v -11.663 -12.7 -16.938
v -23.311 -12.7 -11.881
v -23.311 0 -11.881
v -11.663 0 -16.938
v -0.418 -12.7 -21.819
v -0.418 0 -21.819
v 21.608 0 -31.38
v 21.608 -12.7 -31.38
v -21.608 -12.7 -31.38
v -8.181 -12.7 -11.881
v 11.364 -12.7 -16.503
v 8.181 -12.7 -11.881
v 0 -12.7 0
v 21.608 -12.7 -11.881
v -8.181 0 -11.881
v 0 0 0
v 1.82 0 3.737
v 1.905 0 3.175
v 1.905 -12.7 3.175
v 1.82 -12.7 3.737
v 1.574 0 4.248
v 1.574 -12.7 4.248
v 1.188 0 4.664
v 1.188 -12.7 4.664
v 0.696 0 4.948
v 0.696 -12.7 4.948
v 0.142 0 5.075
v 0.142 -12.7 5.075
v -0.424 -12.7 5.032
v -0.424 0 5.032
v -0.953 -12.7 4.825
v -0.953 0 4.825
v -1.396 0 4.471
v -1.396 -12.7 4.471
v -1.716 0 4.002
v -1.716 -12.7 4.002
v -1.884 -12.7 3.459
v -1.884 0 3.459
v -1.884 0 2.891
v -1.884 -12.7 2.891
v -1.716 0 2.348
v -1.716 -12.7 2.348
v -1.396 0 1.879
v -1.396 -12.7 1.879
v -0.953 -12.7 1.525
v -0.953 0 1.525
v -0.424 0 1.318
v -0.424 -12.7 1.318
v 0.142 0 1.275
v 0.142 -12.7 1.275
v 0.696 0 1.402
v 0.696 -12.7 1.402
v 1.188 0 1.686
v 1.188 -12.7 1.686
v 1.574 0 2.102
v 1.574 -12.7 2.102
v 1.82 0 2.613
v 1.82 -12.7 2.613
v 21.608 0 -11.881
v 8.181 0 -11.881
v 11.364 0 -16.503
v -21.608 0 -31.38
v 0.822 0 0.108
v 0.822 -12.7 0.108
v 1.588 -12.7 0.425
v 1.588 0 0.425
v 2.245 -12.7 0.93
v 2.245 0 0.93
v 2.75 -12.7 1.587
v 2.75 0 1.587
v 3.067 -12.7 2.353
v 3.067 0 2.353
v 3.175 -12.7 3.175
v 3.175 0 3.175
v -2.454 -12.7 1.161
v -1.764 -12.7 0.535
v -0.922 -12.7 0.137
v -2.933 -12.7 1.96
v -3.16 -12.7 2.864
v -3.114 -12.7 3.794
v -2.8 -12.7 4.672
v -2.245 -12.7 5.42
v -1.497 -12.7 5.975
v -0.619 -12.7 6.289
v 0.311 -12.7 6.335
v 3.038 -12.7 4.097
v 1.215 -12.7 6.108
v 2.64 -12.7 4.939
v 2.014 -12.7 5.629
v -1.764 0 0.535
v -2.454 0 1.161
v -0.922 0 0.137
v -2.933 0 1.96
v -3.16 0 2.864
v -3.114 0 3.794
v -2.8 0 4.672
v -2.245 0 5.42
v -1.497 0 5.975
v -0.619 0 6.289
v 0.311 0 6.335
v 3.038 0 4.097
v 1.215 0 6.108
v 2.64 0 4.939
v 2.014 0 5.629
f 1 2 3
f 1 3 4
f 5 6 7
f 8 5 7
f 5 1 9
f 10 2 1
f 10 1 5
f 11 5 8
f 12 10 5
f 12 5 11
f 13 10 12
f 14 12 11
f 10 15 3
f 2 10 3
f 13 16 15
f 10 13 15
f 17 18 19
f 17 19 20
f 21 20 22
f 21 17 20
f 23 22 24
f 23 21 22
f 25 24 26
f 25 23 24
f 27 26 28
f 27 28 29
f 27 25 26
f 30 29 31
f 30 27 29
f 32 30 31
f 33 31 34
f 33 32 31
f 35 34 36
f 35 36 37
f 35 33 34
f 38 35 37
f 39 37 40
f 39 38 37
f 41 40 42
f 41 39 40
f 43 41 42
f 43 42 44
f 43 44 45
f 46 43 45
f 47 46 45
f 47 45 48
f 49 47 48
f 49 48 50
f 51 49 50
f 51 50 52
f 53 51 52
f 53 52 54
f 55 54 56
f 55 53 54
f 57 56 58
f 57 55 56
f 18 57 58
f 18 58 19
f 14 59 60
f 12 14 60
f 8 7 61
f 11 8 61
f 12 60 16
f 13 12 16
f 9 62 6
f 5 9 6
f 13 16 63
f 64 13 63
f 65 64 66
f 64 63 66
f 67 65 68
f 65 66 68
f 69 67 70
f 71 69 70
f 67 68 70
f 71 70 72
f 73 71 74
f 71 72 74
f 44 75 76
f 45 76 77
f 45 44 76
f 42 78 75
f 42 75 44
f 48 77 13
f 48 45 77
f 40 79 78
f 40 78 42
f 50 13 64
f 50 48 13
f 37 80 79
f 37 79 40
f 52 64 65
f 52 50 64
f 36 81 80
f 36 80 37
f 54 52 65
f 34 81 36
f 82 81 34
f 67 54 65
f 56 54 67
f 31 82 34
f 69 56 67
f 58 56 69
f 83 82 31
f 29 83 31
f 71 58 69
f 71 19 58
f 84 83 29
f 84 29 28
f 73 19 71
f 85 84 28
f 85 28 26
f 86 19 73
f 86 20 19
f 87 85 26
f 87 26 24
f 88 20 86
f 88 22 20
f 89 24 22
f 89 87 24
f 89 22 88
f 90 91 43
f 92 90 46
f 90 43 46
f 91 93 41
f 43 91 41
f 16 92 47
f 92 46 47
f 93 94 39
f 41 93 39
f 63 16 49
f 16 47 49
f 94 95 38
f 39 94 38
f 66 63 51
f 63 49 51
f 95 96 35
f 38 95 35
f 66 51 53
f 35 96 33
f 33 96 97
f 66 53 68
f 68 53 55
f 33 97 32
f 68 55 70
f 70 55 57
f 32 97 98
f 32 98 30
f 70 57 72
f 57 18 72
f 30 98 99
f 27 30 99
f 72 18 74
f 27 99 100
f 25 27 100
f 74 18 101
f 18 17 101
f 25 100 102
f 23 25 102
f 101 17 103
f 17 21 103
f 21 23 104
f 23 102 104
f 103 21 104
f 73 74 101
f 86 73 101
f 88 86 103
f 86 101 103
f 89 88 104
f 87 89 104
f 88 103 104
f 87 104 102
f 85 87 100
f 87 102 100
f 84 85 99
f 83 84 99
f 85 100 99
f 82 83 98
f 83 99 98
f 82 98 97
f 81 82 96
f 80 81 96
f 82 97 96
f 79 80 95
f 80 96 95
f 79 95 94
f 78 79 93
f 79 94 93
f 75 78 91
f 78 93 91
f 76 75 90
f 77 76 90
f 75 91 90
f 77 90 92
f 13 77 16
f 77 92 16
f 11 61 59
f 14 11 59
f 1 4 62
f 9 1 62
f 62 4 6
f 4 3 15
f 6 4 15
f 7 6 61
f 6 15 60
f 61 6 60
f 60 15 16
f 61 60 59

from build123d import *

# Parameters (mm, degrees)
F1_DEPTH = 12.7
F0_R     = 1.905


with BuildPart() as f1:
    # F0 (on Front) → F1 (new body)
    with BuildSketch(Plane.XZ):
        Polygon((8.181161038, -11.8811847642), (-8.181161038, -11.8811847642), (-11.6629169429, -16.9376046315), (-0.4176200962, -21.8190980417), (11.3638446399, -16.5032734561), align=None)
        Polygon((8.181161038, -11.8811847642), (0, 0), (-8.181161038, -11.8811847642), align=None)
        Polygon((21.6077821616, -11.8811847642), (8.181161038, -11.8811847642), (11.3638446399, -16.5032734561), align=None)
        Polygon((21.6077821616, -31.3801489808), (11.3638446399, -16.5032734561), (-0.4176200962, -21.8190980417), align=None)
        Polygon((-0.4176200962, -21.8190980417), (-11.6629169429, -16.9376046315), (-21.6077821616, -31.3801489808), align=None)
        Polygon((-11.6629169429, -16.9376046315), (-8.181161038, -11.8811847642), (-23.3111847192, -11.8811847642), align=None)
    extrude(amount=F1_DEPTH)


with BuildPart() as f1b:
    # F0 (on Front) → F1, piece 2 (new body)
    with BuildSketch(Plane.XZ):
        with BuildLine():
            ThreePointArc((3.175, 3.175), (-2.2450640303, 5.4200640303), (0, 0))
            ThreePointArc((0, 0), (2.2450640303, 0.9299359697), (3.175, 3.175))
        make_face()
        with Locations((0, 3.175)):
            Circle(F0_R, mode=Mode.SUBTRACT)
    extrude(amount=F1_DEPTH)


solid = Compound([f1.part, f1b.part])
